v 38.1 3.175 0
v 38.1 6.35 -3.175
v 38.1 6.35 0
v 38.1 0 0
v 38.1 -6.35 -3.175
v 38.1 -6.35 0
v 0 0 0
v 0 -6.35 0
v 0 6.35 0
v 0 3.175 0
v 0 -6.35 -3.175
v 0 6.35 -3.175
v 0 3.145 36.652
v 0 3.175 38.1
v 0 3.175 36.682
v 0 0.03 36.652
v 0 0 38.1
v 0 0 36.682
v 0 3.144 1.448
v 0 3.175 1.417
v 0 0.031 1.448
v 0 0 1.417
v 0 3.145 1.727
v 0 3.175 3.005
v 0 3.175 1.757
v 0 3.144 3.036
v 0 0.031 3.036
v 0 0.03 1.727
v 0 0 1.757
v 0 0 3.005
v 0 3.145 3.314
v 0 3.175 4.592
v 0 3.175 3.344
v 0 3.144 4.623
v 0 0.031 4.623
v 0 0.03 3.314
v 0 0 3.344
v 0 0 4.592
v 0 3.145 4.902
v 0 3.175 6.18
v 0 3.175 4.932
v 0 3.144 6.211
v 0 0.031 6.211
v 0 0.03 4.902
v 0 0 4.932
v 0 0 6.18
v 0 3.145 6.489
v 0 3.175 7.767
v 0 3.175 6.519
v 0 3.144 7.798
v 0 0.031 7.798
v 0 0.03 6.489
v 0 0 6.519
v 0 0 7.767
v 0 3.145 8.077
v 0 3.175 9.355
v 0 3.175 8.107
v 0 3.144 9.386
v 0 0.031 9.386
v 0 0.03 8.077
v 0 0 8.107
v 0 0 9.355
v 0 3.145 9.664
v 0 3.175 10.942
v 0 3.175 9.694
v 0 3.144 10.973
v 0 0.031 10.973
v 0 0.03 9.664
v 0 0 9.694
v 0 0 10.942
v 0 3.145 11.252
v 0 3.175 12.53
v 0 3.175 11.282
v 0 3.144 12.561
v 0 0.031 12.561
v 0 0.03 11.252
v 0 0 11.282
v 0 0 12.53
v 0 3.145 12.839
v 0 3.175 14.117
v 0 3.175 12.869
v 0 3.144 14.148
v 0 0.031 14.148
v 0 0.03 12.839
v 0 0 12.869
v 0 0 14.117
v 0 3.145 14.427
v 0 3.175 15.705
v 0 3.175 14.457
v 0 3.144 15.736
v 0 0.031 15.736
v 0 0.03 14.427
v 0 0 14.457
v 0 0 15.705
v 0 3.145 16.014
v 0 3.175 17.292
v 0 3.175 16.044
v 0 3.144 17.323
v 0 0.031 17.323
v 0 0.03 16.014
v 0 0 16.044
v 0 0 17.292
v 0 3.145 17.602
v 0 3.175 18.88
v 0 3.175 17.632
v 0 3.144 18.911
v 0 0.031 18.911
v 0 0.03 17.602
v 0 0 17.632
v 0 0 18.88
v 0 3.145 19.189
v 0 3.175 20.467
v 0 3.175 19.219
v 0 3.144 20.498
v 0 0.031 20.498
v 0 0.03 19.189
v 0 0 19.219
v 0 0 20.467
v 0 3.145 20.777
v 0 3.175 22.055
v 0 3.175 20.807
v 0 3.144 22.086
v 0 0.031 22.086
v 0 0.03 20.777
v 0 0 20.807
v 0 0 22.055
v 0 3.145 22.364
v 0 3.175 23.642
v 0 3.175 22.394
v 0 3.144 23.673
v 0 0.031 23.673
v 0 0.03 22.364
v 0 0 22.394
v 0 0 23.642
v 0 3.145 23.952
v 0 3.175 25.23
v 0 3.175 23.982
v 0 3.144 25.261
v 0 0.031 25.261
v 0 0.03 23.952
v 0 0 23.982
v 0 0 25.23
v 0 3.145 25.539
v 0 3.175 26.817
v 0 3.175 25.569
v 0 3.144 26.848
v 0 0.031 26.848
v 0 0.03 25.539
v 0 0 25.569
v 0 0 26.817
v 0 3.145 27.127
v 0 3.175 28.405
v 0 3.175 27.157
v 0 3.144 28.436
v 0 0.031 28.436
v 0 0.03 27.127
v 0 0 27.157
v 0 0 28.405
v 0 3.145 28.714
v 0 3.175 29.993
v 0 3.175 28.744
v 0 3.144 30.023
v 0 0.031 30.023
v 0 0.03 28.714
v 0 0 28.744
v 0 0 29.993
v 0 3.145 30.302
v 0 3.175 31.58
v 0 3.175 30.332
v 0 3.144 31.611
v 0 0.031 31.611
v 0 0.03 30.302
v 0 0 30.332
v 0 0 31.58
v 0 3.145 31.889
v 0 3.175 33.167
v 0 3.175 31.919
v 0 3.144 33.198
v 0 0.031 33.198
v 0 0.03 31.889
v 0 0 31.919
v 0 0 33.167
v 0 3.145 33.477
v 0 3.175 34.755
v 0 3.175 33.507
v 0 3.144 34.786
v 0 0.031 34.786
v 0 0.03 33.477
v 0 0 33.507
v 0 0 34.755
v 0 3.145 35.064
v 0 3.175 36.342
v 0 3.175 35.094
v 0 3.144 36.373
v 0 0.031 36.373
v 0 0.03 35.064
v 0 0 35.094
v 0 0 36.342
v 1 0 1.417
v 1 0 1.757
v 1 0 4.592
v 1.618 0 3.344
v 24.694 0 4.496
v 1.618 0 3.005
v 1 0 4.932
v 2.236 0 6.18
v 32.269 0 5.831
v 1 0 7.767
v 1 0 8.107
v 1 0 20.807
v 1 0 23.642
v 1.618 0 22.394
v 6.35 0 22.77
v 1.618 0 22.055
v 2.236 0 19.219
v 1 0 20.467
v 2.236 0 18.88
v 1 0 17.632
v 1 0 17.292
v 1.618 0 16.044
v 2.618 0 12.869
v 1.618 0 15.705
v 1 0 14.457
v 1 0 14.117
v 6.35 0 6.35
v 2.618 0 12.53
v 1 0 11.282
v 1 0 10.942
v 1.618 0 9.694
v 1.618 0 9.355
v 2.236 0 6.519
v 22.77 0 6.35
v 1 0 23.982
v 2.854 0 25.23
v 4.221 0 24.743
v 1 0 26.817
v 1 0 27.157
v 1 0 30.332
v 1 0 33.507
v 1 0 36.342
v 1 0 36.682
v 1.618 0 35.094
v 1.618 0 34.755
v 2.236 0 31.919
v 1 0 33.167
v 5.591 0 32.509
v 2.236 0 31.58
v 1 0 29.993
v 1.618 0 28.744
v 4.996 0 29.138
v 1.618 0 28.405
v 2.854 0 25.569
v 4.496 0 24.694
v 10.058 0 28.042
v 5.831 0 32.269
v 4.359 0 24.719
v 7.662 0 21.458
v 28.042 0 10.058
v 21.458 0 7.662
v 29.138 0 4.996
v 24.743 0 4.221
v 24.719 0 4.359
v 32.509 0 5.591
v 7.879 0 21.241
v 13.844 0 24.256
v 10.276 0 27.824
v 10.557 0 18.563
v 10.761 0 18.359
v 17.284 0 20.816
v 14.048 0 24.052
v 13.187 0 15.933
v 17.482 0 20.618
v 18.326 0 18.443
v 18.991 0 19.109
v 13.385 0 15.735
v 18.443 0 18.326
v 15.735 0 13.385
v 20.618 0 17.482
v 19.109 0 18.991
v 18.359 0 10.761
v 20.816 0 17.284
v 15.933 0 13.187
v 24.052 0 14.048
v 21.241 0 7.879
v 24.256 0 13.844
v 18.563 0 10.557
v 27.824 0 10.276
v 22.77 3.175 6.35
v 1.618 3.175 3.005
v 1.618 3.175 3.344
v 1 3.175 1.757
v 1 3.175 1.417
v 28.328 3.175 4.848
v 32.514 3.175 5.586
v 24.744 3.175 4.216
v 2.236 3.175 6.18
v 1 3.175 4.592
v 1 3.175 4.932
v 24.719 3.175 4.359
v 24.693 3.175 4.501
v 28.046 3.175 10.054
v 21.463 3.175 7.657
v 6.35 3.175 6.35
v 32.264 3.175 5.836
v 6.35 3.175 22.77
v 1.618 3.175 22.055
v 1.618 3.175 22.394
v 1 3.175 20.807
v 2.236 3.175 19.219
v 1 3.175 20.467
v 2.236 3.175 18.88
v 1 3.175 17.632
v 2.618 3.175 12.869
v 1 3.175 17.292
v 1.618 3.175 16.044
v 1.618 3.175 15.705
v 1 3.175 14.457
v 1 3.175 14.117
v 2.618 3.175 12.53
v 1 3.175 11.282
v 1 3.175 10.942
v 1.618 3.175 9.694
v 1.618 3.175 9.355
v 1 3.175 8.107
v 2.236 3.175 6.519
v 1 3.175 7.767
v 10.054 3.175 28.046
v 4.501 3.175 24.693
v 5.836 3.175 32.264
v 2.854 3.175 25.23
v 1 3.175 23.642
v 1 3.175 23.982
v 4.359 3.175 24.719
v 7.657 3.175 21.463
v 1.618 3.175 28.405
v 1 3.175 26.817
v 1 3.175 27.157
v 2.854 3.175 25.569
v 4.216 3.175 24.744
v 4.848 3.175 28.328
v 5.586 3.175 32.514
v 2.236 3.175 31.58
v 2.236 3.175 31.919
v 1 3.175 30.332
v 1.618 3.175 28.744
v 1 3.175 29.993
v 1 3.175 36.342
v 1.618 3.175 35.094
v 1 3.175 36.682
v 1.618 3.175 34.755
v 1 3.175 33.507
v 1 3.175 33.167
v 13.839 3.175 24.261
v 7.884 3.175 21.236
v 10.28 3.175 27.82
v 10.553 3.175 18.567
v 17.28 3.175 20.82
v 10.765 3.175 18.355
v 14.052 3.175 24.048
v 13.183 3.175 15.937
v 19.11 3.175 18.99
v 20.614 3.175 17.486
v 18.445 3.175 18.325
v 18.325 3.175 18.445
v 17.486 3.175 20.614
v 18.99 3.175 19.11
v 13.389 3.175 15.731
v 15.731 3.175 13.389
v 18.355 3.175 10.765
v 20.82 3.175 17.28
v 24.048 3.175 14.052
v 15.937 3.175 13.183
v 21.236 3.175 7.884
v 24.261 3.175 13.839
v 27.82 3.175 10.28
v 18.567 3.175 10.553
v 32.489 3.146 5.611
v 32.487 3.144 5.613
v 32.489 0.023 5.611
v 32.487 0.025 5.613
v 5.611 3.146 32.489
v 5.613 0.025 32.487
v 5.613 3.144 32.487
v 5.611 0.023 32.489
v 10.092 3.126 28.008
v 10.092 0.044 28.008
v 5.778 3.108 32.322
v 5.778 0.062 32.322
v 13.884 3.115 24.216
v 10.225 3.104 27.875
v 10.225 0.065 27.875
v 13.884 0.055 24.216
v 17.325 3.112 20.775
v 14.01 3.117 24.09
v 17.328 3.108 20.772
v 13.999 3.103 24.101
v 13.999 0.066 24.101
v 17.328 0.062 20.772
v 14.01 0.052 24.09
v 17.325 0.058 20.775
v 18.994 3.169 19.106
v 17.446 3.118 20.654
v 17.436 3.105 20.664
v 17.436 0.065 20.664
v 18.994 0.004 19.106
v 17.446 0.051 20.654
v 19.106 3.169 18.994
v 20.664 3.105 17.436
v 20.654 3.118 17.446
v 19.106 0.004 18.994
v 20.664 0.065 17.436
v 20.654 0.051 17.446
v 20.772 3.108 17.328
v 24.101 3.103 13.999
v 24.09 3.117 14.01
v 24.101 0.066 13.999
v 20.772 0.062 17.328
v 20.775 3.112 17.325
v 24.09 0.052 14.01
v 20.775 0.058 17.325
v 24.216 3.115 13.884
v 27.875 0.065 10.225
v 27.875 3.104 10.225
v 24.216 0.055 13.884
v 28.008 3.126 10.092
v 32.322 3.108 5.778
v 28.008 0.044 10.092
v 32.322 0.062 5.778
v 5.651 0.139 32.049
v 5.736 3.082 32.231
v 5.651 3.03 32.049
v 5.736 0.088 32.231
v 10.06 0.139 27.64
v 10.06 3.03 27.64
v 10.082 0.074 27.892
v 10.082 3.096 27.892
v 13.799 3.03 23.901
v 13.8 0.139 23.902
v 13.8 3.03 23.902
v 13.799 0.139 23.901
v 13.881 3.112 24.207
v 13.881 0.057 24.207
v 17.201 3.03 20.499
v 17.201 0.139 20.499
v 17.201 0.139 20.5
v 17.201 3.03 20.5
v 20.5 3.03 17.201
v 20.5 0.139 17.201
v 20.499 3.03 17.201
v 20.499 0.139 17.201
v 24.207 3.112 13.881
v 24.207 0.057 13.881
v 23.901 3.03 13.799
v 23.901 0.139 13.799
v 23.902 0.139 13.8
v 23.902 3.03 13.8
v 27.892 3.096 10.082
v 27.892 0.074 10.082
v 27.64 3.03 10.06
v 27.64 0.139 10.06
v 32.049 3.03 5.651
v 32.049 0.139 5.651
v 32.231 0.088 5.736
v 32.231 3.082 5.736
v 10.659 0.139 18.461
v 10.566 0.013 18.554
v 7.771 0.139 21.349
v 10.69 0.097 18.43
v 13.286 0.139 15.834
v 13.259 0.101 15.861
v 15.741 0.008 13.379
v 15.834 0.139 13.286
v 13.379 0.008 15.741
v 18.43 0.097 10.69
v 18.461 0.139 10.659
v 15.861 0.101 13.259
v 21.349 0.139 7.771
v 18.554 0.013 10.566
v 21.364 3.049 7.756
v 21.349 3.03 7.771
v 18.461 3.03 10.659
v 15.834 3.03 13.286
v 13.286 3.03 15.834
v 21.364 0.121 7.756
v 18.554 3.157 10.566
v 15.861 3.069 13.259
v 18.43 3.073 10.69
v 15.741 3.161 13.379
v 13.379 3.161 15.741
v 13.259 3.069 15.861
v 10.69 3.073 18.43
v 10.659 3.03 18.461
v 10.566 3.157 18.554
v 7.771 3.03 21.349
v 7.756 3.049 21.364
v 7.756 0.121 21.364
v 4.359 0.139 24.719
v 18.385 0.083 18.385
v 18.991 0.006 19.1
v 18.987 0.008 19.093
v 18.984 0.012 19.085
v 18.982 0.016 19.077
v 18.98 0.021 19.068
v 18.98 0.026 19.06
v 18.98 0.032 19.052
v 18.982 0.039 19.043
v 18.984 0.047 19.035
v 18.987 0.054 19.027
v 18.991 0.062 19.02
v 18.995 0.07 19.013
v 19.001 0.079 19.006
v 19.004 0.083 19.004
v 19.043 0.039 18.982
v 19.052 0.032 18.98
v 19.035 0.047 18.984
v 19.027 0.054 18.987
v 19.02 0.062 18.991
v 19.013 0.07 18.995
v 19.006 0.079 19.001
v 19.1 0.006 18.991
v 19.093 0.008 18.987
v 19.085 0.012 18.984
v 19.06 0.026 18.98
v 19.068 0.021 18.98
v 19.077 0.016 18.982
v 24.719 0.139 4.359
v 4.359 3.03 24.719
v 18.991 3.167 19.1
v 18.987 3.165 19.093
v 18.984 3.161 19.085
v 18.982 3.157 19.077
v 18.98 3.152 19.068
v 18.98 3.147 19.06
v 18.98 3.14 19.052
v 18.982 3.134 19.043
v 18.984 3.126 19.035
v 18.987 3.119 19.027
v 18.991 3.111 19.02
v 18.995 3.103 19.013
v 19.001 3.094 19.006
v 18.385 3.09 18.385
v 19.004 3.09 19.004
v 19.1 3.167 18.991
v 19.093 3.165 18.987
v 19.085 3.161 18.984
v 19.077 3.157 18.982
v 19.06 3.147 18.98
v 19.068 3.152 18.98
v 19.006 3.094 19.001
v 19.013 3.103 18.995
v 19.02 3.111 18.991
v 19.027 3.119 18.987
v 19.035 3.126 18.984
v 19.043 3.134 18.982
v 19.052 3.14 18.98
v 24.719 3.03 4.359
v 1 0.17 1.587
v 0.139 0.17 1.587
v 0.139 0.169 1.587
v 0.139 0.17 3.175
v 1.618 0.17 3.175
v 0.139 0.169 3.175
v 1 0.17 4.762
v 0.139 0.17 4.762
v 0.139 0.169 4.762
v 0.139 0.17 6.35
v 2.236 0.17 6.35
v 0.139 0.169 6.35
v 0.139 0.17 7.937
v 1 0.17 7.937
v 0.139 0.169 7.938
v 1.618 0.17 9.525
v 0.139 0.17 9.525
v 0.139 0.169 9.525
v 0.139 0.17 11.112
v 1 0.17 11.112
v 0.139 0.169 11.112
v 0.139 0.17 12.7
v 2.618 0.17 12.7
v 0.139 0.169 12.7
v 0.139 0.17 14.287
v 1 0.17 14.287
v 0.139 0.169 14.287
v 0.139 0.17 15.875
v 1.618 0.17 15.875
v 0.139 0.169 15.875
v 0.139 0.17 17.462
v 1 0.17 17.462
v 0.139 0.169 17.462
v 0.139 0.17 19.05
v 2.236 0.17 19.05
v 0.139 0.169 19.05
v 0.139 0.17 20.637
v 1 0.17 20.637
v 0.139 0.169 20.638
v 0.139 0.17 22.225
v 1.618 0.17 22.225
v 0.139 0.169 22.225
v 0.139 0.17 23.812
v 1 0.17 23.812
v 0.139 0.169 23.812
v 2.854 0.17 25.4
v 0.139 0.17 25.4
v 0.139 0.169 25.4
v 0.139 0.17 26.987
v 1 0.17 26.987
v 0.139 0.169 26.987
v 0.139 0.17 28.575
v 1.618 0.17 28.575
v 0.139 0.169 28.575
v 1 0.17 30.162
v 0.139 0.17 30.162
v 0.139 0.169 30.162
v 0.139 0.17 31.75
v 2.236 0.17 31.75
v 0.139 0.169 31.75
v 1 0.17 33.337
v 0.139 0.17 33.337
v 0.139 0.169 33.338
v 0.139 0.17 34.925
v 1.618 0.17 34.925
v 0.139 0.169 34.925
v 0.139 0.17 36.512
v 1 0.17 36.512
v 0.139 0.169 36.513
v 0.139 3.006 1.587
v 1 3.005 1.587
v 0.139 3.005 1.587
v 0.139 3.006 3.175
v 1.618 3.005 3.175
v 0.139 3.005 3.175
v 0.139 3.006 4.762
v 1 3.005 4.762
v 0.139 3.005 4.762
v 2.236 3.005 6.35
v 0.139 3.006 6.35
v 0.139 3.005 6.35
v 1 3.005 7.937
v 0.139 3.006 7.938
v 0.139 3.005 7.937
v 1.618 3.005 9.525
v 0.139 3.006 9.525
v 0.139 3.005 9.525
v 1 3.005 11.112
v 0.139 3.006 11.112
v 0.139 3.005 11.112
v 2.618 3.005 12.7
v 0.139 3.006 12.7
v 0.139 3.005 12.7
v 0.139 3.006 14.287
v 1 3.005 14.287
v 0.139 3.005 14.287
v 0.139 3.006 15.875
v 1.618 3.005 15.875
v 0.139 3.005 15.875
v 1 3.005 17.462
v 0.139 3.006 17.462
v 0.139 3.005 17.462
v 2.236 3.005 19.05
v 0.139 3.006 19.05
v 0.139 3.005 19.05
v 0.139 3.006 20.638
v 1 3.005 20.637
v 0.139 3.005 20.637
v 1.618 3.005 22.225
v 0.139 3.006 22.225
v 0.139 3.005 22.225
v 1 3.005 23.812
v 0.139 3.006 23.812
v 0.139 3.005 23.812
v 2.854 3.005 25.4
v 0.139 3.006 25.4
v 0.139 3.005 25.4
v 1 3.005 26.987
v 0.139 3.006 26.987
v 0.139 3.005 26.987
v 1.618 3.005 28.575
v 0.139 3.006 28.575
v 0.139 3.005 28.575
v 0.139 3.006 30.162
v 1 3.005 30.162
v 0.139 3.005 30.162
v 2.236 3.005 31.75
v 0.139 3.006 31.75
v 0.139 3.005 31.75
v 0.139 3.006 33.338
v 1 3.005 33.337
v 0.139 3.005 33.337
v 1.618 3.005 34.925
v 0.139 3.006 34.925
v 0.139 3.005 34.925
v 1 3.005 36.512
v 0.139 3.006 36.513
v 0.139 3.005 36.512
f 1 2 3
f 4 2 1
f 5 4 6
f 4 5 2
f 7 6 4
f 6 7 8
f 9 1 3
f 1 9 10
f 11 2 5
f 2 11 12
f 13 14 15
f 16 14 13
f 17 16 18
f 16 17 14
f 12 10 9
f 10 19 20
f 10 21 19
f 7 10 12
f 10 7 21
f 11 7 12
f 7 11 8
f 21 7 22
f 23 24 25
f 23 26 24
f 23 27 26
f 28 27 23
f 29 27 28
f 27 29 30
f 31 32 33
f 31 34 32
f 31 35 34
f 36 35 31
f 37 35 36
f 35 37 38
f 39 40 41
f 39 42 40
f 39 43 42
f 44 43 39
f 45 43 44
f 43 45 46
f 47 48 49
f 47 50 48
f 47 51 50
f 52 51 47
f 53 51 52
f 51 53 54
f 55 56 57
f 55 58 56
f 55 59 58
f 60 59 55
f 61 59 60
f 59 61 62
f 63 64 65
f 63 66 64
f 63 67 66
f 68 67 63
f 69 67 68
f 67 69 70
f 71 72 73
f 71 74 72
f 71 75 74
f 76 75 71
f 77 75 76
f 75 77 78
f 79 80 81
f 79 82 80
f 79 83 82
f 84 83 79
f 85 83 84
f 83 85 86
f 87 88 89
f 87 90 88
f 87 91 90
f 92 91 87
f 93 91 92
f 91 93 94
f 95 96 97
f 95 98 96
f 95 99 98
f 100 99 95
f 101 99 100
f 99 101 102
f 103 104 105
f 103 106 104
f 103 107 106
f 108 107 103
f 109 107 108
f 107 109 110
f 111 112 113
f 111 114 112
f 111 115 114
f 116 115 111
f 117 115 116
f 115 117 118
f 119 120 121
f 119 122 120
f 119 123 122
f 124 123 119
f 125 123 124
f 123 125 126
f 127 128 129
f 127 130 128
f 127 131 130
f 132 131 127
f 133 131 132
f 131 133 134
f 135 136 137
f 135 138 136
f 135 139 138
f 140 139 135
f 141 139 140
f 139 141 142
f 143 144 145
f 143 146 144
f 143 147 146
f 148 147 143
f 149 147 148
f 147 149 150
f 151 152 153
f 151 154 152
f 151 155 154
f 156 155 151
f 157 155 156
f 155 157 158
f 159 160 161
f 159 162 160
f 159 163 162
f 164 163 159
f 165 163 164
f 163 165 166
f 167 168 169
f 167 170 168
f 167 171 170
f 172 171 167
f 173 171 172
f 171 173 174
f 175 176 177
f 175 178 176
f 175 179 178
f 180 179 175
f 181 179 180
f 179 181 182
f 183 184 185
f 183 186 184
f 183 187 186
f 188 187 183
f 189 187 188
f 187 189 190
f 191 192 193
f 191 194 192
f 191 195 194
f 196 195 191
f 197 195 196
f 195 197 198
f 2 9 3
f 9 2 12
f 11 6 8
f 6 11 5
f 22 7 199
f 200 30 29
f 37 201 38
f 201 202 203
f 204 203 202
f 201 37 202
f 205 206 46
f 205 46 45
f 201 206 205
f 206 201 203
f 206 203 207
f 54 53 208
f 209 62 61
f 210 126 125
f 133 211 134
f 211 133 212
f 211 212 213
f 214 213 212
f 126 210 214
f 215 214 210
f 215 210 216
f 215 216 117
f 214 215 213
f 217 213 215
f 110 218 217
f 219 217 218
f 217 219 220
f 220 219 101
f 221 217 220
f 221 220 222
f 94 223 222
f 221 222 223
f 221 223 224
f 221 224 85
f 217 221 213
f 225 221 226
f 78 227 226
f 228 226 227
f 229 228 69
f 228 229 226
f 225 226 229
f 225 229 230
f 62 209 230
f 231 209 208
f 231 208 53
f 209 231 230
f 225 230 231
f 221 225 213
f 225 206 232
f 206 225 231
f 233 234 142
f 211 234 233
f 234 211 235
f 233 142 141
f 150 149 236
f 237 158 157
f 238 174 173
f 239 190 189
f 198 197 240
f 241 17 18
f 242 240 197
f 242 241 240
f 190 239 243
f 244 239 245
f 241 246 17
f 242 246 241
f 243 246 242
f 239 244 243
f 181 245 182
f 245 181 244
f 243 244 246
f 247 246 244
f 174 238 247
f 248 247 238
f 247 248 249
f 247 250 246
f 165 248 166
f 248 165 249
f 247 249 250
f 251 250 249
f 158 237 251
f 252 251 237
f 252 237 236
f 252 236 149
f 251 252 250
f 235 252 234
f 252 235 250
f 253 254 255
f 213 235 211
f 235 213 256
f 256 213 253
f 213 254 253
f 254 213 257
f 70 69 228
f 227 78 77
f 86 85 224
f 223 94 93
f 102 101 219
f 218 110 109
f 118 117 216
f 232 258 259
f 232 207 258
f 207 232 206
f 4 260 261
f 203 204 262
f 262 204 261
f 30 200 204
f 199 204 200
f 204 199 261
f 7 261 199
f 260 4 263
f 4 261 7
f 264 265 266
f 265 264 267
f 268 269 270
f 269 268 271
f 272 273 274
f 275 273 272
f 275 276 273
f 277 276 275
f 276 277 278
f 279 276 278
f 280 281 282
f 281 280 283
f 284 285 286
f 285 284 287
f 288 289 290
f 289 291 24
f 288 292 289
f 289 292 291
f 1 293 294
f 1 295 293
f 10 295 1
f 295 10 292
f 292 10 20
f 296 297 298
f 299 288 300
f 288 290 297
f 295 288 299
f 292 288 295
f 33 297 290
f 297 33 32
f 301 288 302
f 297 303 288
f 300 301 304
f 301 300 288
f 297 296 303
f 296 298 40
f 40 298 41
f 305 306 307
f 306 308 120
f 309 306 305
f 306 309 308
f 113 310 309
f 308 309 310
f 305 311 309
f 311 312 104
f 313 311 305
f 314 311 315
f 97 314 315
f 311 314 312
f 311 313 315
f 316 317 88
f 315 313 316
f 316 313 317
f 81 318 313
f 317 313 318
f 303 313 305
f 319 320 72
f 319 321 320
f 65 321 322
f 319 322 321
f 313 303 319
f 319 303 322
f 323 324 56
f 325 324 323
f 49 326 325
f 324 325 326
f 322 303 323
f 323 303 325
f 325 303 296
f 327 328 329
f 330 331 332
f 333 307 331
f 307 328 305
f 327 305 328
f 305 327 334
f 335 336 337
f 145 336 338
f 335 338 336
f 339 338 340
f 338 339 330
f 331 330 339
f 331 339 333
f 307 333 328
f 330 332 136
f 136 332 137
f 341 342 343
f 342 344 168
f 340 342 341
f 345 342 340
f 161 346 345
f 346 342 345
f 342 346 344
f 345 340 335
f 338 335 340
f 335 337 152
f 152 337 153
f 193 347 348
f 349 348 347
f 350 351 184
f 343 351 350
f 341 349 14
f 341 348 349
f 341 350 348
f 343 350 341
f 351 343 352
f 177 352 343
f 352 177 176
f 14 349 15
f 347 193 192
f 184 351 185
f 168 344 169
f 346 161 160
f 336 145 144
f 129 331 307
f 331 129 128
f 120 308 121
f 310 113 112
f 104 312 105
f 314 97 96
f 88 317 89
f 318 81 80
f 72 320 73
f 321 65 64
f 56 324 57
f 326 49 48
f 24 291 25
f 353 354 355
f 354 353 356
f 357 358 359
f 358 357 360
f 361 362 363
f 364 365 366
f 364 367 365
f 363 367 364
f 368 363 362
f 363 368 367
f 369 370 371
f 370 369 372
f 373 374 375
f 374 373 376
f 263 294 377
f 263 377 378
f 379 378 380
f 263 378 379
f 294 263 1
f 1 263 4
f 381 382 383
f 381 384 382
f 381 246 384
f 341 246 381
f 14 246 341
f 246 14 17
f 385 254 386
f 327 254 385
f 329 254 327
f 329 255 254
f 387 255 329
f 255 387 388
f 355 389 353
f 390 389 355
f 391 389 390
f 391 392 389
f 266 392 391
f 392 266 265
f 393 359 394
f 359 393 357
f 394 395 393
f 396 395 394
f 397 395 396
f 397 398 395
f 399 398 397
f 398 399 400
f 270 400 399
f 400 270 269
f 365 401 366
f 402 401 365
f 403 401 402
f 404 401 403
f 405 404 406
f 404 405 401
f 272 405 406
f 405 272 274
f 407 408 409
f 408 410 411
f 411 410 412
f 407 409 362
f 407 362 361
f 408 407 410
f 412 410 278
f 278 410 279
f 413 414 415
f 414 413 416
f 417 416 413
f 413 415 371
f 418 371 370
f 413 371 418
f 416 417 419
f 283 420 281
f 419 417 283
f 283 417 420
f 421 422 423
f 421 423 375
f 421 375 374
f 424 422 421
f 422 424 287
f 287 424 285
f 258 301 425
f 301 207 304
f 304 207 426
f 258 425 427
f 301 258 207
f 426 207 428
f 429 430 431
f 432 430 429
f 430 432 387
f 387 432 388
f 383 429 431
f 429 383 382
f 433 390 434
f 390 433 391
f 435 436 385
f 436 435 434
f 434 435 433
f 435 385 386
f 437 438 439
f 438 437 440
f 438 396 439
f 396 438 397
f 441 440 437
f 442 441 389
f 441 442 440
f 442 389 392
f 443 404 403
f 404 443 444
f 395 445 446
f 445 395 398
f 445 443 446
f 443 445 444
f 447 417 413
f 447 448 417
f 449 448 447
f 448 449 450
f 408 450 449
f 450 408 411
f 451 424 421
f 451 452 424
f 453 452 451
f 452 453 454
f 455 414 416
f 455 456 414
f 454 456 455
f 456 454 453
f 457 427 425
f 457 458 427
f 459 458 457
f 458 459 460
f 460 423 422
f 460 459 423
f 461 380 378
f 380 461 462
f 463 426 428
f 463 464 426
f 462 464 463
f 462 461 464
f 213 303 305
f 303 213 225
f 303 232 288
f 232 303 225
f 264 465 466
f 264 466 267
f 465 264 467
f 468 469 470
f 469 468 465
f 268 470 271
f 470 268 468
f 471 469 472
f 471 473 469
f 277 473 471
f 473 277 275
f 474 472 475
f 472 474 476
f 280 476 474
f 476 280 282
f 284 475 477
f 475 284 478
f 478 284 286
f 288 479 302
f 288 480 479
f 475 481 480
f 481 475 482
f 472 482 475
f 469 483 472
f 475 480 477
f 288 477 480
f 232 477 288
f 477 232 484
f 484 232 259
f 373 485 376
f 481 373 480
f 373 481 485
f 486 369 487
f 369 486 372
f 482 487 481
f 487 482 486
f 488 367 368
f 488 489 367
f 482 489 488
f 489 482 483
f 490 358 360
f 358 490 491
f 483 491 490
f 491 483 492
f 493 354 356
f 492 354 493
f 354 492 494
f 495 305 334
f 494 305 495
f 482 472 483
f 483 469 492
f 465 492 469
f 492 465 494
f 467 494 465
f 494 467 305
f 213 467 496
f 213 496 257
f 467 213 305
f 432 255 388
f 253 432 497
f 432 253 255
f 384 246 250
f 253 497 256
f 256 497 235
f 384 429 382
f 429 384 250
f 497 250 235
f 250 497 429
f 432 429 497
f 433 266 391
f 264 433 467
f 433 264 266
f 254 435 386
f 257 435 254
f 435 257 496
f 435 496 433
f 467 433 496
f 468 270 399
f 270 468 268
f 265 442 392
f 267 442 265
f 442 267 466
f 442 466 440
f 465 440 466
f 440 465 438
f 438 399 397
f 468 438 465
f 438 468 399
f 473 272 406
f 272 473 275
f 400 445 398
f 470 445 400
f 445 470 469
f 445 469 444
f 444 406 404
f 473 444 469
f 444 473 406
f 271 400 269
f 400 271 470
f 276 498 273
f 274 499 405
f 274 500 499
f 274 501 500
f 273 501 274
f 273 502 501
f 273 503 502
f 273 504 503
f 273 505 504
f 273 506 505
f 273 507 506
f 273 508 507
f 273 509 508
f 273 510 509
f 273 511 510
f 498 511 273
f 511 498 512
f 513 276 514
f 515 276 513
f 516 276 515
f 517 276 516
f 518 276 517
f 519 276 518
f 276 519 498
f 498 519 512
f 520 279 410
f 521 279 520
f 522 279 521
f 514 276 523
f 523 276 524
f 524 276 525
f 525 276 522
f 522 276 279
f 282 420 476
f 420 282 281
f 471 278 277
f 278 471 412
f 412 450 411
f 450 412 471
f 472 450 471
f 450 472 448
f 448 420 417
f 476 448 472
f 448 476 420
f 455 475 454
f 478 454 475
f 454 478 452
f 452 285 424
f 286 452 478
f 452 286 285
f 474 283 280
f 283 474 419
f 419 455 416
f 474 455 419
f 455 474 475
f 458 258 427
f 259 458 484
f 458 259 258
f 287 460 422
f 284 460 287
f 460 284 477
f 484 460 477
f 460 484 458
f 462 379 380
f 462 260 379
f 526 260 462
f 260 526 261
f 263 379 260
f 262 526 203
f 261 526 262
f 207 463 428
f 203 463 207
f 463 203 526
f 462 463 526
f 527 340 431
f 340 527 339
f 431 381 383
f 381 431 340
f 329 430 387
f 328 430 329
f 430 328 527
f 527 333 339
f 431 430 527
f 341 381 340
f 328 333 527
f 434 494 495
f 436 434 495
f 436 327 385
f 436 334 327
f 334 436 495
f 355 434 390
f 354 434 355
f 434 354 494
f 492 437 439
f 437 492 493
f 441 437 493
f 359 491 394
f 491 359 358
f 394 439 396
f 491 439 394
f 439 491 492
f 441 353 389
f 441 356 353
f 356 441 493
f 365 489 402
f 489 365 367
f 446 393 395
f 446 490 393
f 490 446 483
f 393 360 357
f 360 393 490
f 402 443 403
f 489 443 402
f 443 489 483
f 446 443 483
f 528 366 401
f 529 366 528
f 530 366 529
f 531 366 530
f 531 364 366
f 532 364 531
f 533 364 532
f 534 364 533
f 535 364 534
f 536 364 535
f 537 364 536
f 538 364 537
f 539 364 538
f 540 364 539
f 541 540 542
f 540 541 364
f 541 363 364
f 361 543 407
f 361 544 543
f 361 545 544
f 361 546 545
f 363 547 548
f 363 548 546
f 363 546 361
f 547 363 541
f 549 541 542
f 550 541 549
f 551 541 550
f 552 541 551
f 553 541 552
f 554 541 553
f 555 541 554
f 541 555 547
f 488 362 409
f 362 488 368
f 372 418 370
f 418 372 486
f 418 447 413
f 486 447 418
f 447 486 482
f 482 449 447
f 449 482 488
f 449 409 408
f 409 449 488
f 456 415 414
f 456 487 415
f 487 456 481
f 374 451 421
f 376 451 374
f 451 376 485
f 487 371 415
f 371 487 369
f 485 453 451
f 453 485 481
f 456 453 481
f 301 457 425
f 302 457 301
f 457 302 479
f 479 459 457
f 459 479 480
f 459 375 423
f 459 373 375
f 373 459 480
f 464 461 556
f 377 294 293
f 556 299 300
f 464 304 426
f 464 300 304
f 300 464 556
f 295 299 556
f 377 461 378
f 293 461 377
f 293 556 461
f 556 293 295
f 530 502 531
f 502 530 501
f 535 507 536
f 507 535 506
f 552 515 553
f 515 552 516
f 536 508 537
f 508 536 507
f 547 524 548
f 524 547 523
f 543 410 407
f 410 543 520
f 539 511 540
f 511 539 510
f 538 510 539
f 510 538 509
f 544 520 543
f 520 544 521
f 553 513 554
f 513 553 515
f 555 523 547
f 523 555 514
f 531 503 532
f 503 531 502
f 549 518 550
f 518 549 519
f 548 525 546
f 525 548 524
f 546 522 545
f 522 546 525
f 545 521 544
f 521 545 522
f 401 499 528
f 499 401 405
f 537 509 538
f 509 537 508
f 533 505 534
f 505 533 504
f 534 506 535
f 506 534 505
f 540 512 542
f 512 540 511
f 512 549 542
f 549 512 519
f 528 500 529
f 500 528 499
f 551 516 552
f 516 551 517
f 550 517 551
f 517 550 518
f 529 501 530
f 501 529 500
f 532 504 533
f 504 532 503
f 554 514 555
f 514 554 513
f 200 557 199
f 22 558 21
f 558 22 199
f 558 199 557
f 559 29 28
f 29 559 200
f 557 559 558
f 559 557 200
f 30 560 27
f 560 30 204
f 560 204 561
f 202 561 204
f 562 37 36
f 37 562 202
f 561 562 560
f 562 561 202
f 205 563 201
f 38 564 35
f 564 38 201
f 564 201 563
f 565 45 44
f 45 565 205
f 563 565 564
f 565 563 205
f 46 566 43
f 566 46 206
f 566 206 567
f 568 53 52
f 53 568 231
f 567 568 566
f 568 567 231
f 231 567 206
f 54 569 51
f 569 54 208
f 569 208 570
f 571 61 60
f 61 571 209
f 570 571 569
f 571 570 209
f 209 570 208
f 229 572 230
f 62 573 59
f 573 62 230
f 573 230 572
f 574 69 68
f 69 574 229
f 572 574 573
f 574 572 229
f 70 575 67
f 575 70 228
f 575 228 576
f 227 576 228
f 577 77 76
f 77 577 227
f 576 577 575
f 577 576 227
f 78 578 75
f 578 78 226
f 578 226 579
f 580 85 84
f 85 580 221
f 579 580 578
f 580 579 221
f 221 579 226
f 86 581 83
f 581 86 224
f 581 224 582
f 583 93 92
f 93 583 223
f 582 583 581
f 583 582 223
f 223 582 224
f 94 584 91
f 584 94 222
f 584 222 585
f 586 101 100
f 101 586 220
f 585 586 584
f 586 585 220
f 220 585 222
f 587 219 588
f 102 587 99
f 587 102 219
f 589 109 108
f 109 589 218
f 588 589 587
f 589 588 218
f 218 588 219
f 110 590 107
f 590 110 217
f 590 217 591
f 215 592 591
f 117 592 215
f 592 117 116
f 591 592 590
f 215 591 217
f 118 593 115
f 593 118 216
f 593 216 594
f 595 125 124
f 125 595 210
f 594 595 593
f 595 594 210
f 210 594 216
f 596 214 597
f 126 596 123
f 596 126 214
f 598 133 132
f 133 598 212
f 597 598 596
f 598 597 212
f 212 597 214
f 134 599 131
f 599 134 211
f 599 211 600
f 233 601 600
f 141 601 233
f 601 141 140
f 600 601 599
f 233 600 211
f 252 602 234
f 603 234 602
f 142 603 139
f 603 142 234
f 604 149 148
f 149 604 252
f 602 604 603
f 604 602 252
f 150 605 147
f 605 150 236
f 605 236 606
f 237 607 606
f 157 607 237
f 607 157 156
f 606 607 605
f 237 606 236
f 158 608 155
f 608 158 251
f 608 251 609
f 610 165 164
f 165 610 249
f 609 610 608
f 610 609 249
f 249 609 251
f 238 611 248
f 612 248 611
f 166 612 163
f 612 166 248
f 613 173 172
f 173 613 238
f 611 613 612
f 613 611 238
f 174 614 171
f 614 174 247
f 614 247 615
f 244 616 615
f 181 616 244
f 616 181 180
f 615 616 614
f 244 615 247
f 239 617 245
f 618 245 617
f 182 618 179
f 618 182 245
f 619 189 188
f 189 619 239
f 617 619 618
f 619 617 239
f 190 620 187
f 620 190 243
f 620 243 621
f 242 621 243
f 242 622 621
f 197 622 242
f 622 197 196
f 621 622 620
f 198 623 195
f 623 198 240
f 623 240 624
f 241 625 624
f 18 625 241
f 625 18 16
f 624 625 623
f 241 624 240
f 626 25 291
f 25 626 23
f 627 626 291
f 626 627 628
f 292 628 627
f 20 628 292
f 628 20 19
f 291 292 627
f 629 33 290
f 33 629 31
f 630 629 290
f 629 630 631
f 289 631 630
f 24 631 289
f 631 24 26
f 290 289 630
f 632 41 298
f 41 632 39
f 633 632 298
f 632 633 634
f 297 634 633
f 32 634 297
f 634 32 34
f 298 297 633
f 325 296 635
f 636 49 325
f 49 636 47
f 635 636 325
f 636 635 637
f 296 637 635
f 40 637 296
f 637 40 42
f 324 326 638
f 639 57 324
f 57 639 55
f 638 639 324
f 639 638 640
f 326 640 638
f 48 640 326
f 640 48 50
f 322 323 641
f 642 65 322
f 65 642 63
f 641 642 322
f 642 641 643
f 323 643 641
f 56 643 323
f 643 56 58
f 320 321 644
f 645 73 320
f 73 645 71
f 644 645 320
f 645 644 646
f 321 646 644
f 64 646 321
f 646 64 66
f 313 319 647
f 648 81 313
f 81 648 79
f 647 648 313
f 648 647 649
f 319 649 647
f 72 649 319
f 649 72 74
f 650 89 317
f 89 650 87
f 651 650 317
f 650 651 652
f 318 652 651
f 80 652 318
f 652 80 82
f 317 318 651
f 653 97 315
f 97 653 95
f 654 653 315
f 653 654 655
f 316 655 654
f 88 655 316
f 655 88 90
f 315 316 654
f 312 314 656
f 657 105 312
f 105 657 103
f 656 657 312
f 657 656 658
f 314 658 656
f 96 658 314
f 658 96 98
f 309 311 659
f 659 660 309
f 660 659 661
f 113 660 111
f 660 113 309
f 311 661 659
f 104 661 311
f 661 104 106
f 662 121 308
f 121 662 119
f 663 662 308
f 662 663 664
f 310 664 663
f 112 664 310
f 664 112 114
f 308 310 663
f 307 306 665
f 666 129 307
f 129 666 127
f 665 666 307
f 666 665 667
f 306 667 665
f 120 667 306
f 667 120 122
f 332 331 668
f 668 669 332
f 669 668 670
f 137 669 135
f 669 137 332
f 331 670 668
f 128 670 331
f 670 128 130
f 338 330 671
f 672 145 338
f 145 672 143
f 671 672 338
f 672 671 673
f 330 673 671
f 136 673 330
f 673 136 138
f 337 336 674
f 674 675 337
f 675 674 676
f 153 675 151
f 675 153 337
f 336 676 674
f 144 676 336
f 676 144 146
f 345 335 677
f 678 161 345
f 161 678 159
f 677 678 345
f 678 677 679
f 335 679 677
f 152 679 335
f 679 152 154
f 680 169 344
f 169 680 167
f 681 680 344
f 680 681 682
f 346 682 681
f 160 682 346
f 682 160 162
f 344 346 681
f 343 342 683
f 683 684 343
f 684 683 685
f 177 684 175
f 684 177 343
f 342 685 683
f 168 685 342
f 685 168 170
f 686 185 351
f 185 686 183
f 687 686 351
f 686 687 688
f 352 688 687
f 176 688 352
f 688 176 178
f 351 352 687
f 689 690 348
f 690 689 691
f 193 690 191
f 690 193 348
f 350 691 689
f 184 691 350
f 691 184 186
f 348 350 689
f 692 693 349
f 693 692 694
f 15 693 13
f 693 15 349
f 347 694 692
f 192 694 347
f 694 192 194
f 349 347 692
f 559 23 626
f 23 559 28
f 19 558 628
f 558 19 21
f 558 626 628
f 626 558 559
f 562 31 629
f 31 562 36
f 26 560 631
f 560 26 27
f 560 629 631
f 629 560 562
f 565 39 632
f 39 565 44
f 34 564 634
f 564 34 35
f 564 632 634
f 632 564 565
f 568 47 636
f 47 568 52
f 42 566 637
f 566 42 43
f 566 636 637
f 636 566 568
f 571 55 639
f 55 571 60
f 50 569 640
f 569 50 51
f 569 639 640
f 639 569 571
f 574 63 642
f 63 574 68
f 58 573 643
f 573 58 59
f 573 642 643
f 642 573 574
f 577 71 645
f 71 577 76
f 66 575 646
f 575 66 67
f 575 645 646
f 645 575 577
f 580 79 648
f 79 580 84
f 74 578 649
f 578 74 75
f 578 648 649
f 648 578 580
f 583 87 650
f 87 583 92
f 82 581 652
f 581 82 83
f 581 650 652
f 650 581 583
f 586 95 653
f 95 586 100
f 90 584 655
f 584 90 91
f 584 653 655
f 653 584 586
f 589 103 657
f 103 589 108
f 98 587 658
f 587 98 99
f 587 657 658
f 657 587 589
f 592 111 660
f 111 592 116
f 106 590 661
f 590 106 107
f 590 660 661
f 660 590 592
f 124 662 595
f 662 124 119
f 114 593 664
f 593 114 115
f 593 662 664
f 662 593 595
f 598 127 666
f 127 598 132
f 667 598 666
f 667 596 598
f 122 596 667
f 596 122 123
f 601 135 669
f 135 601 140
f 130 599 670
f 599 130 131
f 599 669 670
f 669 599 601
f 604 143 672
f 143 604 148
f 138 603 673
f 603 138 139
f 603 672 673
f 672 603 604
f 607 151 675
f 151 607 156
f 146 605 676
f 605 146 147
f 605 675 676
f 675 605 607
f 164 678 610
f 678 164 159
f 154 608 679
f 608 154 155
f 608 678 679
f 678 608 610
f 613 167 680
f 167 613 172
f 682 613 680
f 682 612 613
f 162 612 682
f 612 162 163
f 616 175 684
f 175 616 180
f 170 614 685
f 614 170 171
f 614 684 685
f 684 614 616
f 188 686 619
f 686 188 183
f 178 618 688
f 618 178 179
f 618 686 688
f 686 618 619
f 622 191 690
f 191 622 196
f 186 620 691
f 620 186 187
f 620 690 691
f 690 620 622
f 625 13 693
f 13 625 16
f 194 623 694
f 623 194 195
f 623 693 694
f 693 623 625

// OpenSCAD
difference(){
union(){
  translate([0,-6.35,-3.175]) cube([38.1,12.7,3.175]);
  polyhedron(
    points=[[0,0,0],
        [38.1,0,0],
        [0,0,38.1],
        [0,3.175,0],
        [38.1,3.175,0],
        [0,3.175,38.1]],
    faces=[[0,2,1],
        [3,5,2,0],
        [4,5,3],
        [1,2,5,4],
        [0,1,4,3]]);
}
polyhedron(
  points=[[6.35,-1,6.35],
      [22.77,-1,6.35],
      [6.35,-1,22.77],
      [6.35,4.175,6.35],
      [22.77,4.175,6.35],
      [6.35,4.175,22.77]],
  faces=[[0,2,1],
      [3,5,2,0],
      [4,5,3],
      [1,2,5,4],
      [0,1,4,3]]);
translate([0,-0.2,0]) rotate([0,10,0]) rotate([0,0,45]) translate([0,0,25.1]) cube([0.24,0.24,25]);
translate([0,-0.2,0]) rotate([0,20,0]) rotate([0,0,45]) translate([0,0,20]) cube([0.24,0.24,25]);
translate([0,-0.2,0]) rotate([0,30,0]) rotate([0,0,45]) translate([0,0,15]) cube([0.24,0.24,25]);
translate([0,-0.2,0]) rotate([0,40,0]) rotate([0,0,45]) translate([0,0,15]) cube([0.24,0.24,25]);
translate([0,-0.2,0]) rotate([0,45,0]) rotate([0,0,45]) translate([0,0,26]) cube([0.20,0.20,25]);
translate([0,-0.2,0]) rotate([0,50,0]) rotate([0,0,45]) translate([0,0,15]) cube([0.24,0.24,25]);
translate([0,-0.2,0]) rotate([0,60,0]) rotate([0,0,45]) translate([0,0,15]) cube([0.24,0.24,25]);
translate([0,-0.2,0]) rotate([0,70,0]) rotate([0,0,45]) translate([0,0,20]) cube([0.24,0.24,25]);
translate([0,-0.2,0]) rotate([0,80,0]) rotate([0,0,45]) translate([0,0,25.1]) cube([0.24,0.24,25]);

translate([0,3.03,0]) rotate([0,10,0]) rotate([0,0,45]) translate([0,0,25.1]) cube([0.24,0.24,25]);
translate([0,3.03,0]) rotate([0,20,0]) rotate([0,0,45]) translate([0,0,20]) cube([0.24,0.24,25]);
translate([0,3.03,0]) rotate([0,30,0]) rotate([0,0,45]) translate([0,0,15]) cube([0.24,0.24,25]);
translate([0,3.03,0]) rotate([0,40,0]) rotate([0,0,45]) translate([0,0,15]) cube([0.24,0.24,25]);
translate([0,3.09,0]) rotate([0,45,0]) rotate([0,0,45]) translate([0,0,26]) cube([0.20,0.20,25]);
translate([0,3.03,0]) rotate([0,50,0]) rotate([0,0,45]) translate([0,0,15]) cube([0.24,0.24,25]);
translate([0,3.03,0]) rotate([0,60,0]) rotate([0,0,45]) translate([0,0,15]) cube([0.24,0.24,25]);
translate([0,3.03,0]) rotate([0,70,0]) rotate([0,0,45]) translate([0,0,20]) cube([0.24,0.24,25]);
translate([0,3.03,0]) rotate([0,80,0]) rotate([0,0,45]) translate([0,0,25.1]) cube([0.24,0.24,25]);

translate([5.651,-2,32.049]) intersection(){
  rotate([0,-65,0]) cube([1,10,2]);
  rotate([0,-5,0]) cube([1,10,2]);
}
translate([10.06,-2,27.64]) intersection(){
  rotate([0,-55,0]) cube([1,10,2]);
  rotate([0,5,0]) cube([1,10,2]);
}
translate([13.799,-2,23.901]) intersection(){
  rotate([0,-45,0]) cube([1,10,2]);
  rotate([0,15,0]) cube([1,10,2]);
}
translate([17.201,-2,20.499]) intersection(){
  rotate([0,-35,0]) cube([1,10,2]);
  rotate([0,25,0]) cube([1,10,2]);
}
$fn=60;
translate([19.06,0,19.06]) rotate([90,0,0]) cylinder(h=20,r=0.08,center=true);
translate([20.499,-2,17.201]) intersection(){
  rotate([0,-25,0]) cube([1,10,2]);
  rotate([0,35,0]) cube([1,10,2]);
}
translate([23.901,-2,13.799]) intersection(){
  rotate([0,-15,0]) cube([1,10,2]);
  rotate([0,45,0]) cube([1,10,2]);
}
translate([27.64,-2,10.06]) intersection(){
  rotate([0,-5,0]) cube([1,10,2]);
  rotate([0,55,0]) cube([1,10,2]);
}
translate([32.049,-2,5.651]) intersection(){
  rotate([0,5,0]) cube([1,10,2]);
  rotate([0,65,0]) cube([1,10,2]);
}

translate([-1,0,1*1.5875-0.17]) rotate([45,0,0]) cube([2.000,0.24,0.24]);
translate([-1,0,2*1.5875-0.17]) rotate([45,0,0]) cube([2.618,0.24,0.24]);
translate([-1,0,3*1.5875-0.17]) rotate([45,0,0]) cube([2.000,0.24,0.24]);
translate([-1,0,4*1.5875-0.17]) rotate([45,0,0]) cube([3.236,0.24,0.24]);
translate([-1,0,5*1.5875-0.17]) rotate([45,0,0]) cube([2.000,0.24,0.24]);
translate([-1,0,6*1.5875-0.17]) rotate([45,0,0]) cube([2.618,0.24,0.24]);
translate([-1,0,7*1.5875-0.17]) rotate([45,0,0]) cube([2.000,0.24,0.24]);
translate([-1,0,8*1.5875-0.17]) rotate([45,0,0]) cube([3.618,0.24,0.24]);
translate([-1,0,9*1.5875-0.17]) rotate([45,0,0]) cube([2.000,0.24,0.24]);
translate([-1,0,10*1.5875-0.17]) rotate([45,0,0]) cube([2.618,0.24,0.24]);
translate([-1,0,11*1.5875-0.17]) rotate([45,0,0]) cube([2.000,0.24,0.24]);
translate([-1,0,12*1.5875-0.17]) rotate([45,0,0]) cube([3.236,0.24,0.24]);
translate([-1,0,13*1.5875-0.17]) rotate([45,0,0]) cube([2.000,0.24,0.24]);
translate([-1,0,14*1.5875-0.17]) rotate([45,0,0]) cube([2.618,0.24,0.24]);
translate([-1,0,15*1.5875-0.17]) rotate([45,0,0]) cube([2.000,0.24,0.24]);
translate([-1,0,16*1.5875-0.17]) rotate([45,0,0]) cube([3.854,0.24,0.24]);
translate([-1,0,17*1.5875-0.17]) rotate([45,0,0]) cube([2.000,0.24,0.24]);
translate([-1,0,18*1.5875-0.17]) rotate([45,0,0]) cube([2.618,0.24,0.24]);
translate([-1,0,19*1.5875-0.17]) rotate([45,0,0]) cube([2.000,0.24,0.24]);
translate([-1,0,20*1.5875-0.17]) rotate([45,0,0]) cube([3.236,0.24,0.24]);
translate([-1,0,21*1.5875-0.17]) rotate([45,0,0]) cube([2.000,0.24,0.24]);
translate([-1,0,22*1.5875-0.17]) rotate([45,0,0]) cube([2.618,0.24,0.24]);
translate([-1,0,23*1.5875-0.17]) rotate([45,0,0]) cube([2.000,0.24,0.24]);

translate([-1,3.175,1*1.5875-0.17]) rotate([45,0,0]) cube([2.000,0.24,0.24]);
translate([-1,3.175,2*1.5875-0.17]) rotate([45,0,0]) cube([2.618,0.24,0.24]);
translate([-1,3.175,3*1.5875-0.17]) rotate([45,0,0]) cube([2.000,0.24,0.24]);
translate([-1,3.175,4*1.5875-0.17]) rotate([45,0,0]) cube([3.236,0.24,0.24]);
translate([-1,3.175,5*1.5875-0.17]) rotate([45,0,0]) cube([2.000,0.24,0.24]);
translate([-1,3.175,6*1.5875-0.17]) rotate([45,0,0]) cube([2.618,0.24,0.24]);
translate([-1,3.175,7*1.5875-0.17]) rotate([45,0,0]) cube([2.000,0.24,0.24]);
translate([-1,3.175,8*1.5875-0.17]) rotate([45,0,0]) cube([3.618,0.24,0.24]);
translate([-1,3.175,9*1.5875-0.17]) rotate([45,0,0]) cube([2.000,0.24,0.24]);
translate([-1,3.175,10*1.5875-0.17]) rotate([45,0,0]) cube([2.618,0.24,0.24]);
translate([-1,3.175,11*1.5875-0.17]) rotate([45,0,0]) cube([2.000,0.24,0.24]);
translate([-1,3.175,12*1.5875-0.17]) rotate([45,0,0]) cube([3.236,0.24,0.24]);
translate([-1,3.175,13*1.5875-0.17]) rotate([45,0,0]) cube([2.000,0.24,0.24]);
translate([-1,3.175,14*1.5875-0.17]) rotate([45,0,0]) cube([2.618,0.24,0.24]);
translate([-1,3.175,15*1.5875-0.17]) rotate([45,0,0]) cube([2.000,0.24,0.24]);
translate([-1,3.175,16*1.5875-0.17]) rotate([45,0,0]) cube([3.854,0.24,0.24]);
translate([-1,3.175,17*1.5875-0.17]) rotate([45,0,0]) cube([2.000,0.24,0.24]);
translate([-1,3.175,18*1.5875-0.17]) rotate([45,0,0]) cube([2.618,0.24,0.24]);
translate([-1,3.175,19*1.5875-0.17]) rotate([45,0,0]) cube([2.000,0.24,0.24]);
translate([-1,3.175,20*1.5875-0.17]) rotate([45,0,0]) cube([3.236,0.24,0.24]);
translate([-1,3.175,21*1.5875-0.17]) rotate([45,0,0]) cube([2.000,0.24,0.24]);
translate([-1,3.175,22*1.5875-0.17]) rotate([45,0,0]) cube([2.618,0.24,0.24]);
translate([-1,3.175,23*1.5875-0.17]) rotate([45,0,0]) cube([2.000,0.24,0.24]);

translate([-0.20,-1,1*1.5875]) rotate([0,45,0]) cube([0.24,5,0.24]);
translate([-0.20,-1,2*1.5875]) rotate([0,45,0]) cube([0.24,5,0.24]);
translate([-0.20,-1,3*1.5875]) rotate([0,45,0]) cube([0.24,5,0.24]);
translate([-0.20,-1,4*1.5875]) rotate([0,45,0]) cube([0.24,5,0.24]);
translate([-0.20,-1,5*1.5875]) rotate([0,45,0]) cube([0.24,5,0.24]);
translate([-0.20,-1,6*1.5875]) rotate([0,45,0]) cube([0.24,5,0.24]);
translate([-0.20,-1,7*1.5875]) rotate([0,45,0]) cube([0.24,5,0.24]);
translate([-0.20,-1,8*1.5875]) rotate([0,45,0]) cube([0.24,5,0.24]);
translate([-0.20,-1,9*1.5875]) rotate([0,45,0]) cube([0.24,5,0.24]);
translate([-0.20,-1,10*1.5875]) rotate([0,45,0]) cube([0.24,5,0.24]);
translate([-0.20,-1,11*1.5875]) rotate([0,45,0]) cube([0.24,5,0.24]);
translate([-0.20,-1,12*1.5875]) rotate([0,45,0]) cube([0.24,5,0.24]);
translate([-0.20,-1,13*1.5875]) rotate([0,45,0]) cube([0.24,5,0.24]);
translate([-0.20,-1,14*1.5875]) rotate([0,45,0]) cube([0.24,5,0.24]);
translate([-0.20,-1,15*1.5875]) rotate([0,45,0]) cube([0.24,5,0.24]);
translate([-0.20,-1,16*1.5875]) rotate([0,45,0]) cube([0.24,5,0.24]);
translate([-0.20,-1,17*1.5875]) rotate([0,45,0]) cube([0.24,5,0.24]);
translate([-0.20,-1,18*1.5875]) rotate([0,45,0]) cube([0.24,5,0.24]);
translate([-0.20,-1,19*1.5875]) rotate([0,45,0]) cube([0.24,5,0.24]);
translate([-0.20,-1,20*1.5875]) rotate([0,45,0]) cube([0.24,5,0.24]);
translate([-0.20,-1,21*1.5875]) rotate([0,45,0]) cube([0.24,5,0.24]);
translate([-0.20,-1,22*1.5875]) rotate([0,45,0]) cube([0.24,5,0.24]);
translate([-0.20,-1,23*1.5875]) rotate([0,45,0]) cube([0.24,5,0.24]);

}
